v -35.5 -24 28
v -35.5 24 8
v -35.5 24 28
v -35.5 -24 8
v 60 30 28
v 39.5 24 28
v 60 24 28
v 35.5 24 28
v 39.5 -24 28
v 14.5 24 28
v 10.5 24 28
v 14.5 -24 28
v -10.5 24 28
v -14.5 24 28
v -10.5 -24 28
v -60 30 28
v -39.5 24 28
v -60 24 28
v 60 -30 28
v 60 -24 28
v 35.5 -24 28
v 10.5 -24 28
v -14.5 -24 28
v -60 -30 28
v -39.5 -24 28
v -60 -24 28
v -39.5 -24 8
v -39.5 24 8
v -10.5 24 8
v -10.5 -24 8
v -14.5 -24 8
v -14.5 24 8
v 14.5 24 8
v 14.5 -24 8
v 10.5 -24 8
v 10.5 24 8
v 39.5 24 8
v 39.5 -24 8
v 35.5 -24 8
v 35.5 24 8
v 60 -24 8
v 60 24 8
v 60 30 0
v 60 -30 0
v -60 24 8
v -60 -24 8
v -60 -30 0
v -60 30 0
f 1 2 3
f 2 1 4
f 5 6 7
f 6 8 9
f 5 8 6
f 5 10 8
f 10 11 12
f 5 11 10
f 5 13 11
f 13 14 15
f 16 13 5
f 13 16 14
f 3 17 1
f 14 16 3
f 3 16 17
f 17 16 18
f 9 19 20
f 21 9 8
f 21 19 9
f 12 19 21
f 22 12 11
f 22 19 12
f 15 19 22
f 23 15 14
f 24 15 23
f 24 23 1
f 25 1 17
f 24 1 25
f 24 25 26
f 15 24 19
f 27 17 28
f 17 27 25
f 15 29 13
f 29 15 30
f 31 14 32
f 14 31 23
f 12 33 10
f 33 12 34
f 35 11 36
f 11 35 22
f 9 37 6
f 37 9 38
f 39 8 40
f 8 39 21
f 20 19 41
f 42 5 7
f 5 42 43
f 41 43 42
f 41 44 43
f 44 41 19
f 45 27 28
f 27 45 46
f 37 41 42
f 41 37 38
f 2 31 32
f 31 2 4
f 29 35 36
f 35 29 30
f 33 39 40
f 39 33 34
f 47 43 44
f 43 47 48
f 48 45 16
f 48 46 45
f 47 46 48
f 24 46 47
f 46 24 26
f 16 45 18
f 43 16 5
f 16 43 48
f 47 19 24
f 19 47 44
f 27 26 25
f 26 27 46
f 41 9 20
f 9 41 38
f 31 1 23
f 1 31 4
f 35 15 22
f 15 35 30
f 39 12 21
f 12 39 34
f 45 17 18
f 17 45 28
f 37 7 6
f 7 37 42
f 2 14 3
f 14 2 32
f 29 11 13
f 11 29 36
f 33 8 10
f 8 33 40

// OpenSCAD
$fn = 32;

// ----------------------------------------------------------------------
// Rib frame 120 x 60 x 28
// 4 ribs at 25 mm pitch
// ----------------------------------------------------------------------

// --- parameters (mm) ---
frame = [120, 60, 8];  // base plate size (x, y, z)
rail_w = 6;            // side rail width
ribs = 4;              // number of ribs
rib_t = 4;             // rib thickness
rib_h = 20;            // rib height above the base plate
pitch = 25;            // pitch between rib centres

// --- derived feature positions (mm) ---
span = (ribs - 1) * pitch;          // = 75   distance between the outer ribs
origin_x = -span / 2;               // = -37.5   X of the first rib
rib_len = frame[1] - 2 * rail_w + 2;  // = 50   rib length, 1 mm into each rail
feature_centers = [
  [origin_x + 0 * pitch, 0],
  [origin_x + 1 * pitch, 0],
  [origin_x + 2 * pitch, 0],
  [origin_x + 3 * pitch, 0]
];   // rib centre line, drives the rib loop

// base plate, two side rails, then the ribs read straight off feature_centers
union() {
  translate([-frame[0] / 2, -frame[1] / 2, 0]) cube(frame);
  translate([-frame[0] / 2, -frame[1] / 2, 0]) cube([frame[0], rail_w, frame[2] + rib_h]);
  translate([-frame[0] / 2, frame[1] / 2 - rail_w, 0]) cube([frame[0], rail_w, frame[2] + rib_h]);
  for (centre = feature_centers)
    translate([centre[0] - rib_t / 2, centre[1] - rib_len / 2, frame[2] - 1])
      cube([rib_t, rib_len, rib_h + 1]);
}
